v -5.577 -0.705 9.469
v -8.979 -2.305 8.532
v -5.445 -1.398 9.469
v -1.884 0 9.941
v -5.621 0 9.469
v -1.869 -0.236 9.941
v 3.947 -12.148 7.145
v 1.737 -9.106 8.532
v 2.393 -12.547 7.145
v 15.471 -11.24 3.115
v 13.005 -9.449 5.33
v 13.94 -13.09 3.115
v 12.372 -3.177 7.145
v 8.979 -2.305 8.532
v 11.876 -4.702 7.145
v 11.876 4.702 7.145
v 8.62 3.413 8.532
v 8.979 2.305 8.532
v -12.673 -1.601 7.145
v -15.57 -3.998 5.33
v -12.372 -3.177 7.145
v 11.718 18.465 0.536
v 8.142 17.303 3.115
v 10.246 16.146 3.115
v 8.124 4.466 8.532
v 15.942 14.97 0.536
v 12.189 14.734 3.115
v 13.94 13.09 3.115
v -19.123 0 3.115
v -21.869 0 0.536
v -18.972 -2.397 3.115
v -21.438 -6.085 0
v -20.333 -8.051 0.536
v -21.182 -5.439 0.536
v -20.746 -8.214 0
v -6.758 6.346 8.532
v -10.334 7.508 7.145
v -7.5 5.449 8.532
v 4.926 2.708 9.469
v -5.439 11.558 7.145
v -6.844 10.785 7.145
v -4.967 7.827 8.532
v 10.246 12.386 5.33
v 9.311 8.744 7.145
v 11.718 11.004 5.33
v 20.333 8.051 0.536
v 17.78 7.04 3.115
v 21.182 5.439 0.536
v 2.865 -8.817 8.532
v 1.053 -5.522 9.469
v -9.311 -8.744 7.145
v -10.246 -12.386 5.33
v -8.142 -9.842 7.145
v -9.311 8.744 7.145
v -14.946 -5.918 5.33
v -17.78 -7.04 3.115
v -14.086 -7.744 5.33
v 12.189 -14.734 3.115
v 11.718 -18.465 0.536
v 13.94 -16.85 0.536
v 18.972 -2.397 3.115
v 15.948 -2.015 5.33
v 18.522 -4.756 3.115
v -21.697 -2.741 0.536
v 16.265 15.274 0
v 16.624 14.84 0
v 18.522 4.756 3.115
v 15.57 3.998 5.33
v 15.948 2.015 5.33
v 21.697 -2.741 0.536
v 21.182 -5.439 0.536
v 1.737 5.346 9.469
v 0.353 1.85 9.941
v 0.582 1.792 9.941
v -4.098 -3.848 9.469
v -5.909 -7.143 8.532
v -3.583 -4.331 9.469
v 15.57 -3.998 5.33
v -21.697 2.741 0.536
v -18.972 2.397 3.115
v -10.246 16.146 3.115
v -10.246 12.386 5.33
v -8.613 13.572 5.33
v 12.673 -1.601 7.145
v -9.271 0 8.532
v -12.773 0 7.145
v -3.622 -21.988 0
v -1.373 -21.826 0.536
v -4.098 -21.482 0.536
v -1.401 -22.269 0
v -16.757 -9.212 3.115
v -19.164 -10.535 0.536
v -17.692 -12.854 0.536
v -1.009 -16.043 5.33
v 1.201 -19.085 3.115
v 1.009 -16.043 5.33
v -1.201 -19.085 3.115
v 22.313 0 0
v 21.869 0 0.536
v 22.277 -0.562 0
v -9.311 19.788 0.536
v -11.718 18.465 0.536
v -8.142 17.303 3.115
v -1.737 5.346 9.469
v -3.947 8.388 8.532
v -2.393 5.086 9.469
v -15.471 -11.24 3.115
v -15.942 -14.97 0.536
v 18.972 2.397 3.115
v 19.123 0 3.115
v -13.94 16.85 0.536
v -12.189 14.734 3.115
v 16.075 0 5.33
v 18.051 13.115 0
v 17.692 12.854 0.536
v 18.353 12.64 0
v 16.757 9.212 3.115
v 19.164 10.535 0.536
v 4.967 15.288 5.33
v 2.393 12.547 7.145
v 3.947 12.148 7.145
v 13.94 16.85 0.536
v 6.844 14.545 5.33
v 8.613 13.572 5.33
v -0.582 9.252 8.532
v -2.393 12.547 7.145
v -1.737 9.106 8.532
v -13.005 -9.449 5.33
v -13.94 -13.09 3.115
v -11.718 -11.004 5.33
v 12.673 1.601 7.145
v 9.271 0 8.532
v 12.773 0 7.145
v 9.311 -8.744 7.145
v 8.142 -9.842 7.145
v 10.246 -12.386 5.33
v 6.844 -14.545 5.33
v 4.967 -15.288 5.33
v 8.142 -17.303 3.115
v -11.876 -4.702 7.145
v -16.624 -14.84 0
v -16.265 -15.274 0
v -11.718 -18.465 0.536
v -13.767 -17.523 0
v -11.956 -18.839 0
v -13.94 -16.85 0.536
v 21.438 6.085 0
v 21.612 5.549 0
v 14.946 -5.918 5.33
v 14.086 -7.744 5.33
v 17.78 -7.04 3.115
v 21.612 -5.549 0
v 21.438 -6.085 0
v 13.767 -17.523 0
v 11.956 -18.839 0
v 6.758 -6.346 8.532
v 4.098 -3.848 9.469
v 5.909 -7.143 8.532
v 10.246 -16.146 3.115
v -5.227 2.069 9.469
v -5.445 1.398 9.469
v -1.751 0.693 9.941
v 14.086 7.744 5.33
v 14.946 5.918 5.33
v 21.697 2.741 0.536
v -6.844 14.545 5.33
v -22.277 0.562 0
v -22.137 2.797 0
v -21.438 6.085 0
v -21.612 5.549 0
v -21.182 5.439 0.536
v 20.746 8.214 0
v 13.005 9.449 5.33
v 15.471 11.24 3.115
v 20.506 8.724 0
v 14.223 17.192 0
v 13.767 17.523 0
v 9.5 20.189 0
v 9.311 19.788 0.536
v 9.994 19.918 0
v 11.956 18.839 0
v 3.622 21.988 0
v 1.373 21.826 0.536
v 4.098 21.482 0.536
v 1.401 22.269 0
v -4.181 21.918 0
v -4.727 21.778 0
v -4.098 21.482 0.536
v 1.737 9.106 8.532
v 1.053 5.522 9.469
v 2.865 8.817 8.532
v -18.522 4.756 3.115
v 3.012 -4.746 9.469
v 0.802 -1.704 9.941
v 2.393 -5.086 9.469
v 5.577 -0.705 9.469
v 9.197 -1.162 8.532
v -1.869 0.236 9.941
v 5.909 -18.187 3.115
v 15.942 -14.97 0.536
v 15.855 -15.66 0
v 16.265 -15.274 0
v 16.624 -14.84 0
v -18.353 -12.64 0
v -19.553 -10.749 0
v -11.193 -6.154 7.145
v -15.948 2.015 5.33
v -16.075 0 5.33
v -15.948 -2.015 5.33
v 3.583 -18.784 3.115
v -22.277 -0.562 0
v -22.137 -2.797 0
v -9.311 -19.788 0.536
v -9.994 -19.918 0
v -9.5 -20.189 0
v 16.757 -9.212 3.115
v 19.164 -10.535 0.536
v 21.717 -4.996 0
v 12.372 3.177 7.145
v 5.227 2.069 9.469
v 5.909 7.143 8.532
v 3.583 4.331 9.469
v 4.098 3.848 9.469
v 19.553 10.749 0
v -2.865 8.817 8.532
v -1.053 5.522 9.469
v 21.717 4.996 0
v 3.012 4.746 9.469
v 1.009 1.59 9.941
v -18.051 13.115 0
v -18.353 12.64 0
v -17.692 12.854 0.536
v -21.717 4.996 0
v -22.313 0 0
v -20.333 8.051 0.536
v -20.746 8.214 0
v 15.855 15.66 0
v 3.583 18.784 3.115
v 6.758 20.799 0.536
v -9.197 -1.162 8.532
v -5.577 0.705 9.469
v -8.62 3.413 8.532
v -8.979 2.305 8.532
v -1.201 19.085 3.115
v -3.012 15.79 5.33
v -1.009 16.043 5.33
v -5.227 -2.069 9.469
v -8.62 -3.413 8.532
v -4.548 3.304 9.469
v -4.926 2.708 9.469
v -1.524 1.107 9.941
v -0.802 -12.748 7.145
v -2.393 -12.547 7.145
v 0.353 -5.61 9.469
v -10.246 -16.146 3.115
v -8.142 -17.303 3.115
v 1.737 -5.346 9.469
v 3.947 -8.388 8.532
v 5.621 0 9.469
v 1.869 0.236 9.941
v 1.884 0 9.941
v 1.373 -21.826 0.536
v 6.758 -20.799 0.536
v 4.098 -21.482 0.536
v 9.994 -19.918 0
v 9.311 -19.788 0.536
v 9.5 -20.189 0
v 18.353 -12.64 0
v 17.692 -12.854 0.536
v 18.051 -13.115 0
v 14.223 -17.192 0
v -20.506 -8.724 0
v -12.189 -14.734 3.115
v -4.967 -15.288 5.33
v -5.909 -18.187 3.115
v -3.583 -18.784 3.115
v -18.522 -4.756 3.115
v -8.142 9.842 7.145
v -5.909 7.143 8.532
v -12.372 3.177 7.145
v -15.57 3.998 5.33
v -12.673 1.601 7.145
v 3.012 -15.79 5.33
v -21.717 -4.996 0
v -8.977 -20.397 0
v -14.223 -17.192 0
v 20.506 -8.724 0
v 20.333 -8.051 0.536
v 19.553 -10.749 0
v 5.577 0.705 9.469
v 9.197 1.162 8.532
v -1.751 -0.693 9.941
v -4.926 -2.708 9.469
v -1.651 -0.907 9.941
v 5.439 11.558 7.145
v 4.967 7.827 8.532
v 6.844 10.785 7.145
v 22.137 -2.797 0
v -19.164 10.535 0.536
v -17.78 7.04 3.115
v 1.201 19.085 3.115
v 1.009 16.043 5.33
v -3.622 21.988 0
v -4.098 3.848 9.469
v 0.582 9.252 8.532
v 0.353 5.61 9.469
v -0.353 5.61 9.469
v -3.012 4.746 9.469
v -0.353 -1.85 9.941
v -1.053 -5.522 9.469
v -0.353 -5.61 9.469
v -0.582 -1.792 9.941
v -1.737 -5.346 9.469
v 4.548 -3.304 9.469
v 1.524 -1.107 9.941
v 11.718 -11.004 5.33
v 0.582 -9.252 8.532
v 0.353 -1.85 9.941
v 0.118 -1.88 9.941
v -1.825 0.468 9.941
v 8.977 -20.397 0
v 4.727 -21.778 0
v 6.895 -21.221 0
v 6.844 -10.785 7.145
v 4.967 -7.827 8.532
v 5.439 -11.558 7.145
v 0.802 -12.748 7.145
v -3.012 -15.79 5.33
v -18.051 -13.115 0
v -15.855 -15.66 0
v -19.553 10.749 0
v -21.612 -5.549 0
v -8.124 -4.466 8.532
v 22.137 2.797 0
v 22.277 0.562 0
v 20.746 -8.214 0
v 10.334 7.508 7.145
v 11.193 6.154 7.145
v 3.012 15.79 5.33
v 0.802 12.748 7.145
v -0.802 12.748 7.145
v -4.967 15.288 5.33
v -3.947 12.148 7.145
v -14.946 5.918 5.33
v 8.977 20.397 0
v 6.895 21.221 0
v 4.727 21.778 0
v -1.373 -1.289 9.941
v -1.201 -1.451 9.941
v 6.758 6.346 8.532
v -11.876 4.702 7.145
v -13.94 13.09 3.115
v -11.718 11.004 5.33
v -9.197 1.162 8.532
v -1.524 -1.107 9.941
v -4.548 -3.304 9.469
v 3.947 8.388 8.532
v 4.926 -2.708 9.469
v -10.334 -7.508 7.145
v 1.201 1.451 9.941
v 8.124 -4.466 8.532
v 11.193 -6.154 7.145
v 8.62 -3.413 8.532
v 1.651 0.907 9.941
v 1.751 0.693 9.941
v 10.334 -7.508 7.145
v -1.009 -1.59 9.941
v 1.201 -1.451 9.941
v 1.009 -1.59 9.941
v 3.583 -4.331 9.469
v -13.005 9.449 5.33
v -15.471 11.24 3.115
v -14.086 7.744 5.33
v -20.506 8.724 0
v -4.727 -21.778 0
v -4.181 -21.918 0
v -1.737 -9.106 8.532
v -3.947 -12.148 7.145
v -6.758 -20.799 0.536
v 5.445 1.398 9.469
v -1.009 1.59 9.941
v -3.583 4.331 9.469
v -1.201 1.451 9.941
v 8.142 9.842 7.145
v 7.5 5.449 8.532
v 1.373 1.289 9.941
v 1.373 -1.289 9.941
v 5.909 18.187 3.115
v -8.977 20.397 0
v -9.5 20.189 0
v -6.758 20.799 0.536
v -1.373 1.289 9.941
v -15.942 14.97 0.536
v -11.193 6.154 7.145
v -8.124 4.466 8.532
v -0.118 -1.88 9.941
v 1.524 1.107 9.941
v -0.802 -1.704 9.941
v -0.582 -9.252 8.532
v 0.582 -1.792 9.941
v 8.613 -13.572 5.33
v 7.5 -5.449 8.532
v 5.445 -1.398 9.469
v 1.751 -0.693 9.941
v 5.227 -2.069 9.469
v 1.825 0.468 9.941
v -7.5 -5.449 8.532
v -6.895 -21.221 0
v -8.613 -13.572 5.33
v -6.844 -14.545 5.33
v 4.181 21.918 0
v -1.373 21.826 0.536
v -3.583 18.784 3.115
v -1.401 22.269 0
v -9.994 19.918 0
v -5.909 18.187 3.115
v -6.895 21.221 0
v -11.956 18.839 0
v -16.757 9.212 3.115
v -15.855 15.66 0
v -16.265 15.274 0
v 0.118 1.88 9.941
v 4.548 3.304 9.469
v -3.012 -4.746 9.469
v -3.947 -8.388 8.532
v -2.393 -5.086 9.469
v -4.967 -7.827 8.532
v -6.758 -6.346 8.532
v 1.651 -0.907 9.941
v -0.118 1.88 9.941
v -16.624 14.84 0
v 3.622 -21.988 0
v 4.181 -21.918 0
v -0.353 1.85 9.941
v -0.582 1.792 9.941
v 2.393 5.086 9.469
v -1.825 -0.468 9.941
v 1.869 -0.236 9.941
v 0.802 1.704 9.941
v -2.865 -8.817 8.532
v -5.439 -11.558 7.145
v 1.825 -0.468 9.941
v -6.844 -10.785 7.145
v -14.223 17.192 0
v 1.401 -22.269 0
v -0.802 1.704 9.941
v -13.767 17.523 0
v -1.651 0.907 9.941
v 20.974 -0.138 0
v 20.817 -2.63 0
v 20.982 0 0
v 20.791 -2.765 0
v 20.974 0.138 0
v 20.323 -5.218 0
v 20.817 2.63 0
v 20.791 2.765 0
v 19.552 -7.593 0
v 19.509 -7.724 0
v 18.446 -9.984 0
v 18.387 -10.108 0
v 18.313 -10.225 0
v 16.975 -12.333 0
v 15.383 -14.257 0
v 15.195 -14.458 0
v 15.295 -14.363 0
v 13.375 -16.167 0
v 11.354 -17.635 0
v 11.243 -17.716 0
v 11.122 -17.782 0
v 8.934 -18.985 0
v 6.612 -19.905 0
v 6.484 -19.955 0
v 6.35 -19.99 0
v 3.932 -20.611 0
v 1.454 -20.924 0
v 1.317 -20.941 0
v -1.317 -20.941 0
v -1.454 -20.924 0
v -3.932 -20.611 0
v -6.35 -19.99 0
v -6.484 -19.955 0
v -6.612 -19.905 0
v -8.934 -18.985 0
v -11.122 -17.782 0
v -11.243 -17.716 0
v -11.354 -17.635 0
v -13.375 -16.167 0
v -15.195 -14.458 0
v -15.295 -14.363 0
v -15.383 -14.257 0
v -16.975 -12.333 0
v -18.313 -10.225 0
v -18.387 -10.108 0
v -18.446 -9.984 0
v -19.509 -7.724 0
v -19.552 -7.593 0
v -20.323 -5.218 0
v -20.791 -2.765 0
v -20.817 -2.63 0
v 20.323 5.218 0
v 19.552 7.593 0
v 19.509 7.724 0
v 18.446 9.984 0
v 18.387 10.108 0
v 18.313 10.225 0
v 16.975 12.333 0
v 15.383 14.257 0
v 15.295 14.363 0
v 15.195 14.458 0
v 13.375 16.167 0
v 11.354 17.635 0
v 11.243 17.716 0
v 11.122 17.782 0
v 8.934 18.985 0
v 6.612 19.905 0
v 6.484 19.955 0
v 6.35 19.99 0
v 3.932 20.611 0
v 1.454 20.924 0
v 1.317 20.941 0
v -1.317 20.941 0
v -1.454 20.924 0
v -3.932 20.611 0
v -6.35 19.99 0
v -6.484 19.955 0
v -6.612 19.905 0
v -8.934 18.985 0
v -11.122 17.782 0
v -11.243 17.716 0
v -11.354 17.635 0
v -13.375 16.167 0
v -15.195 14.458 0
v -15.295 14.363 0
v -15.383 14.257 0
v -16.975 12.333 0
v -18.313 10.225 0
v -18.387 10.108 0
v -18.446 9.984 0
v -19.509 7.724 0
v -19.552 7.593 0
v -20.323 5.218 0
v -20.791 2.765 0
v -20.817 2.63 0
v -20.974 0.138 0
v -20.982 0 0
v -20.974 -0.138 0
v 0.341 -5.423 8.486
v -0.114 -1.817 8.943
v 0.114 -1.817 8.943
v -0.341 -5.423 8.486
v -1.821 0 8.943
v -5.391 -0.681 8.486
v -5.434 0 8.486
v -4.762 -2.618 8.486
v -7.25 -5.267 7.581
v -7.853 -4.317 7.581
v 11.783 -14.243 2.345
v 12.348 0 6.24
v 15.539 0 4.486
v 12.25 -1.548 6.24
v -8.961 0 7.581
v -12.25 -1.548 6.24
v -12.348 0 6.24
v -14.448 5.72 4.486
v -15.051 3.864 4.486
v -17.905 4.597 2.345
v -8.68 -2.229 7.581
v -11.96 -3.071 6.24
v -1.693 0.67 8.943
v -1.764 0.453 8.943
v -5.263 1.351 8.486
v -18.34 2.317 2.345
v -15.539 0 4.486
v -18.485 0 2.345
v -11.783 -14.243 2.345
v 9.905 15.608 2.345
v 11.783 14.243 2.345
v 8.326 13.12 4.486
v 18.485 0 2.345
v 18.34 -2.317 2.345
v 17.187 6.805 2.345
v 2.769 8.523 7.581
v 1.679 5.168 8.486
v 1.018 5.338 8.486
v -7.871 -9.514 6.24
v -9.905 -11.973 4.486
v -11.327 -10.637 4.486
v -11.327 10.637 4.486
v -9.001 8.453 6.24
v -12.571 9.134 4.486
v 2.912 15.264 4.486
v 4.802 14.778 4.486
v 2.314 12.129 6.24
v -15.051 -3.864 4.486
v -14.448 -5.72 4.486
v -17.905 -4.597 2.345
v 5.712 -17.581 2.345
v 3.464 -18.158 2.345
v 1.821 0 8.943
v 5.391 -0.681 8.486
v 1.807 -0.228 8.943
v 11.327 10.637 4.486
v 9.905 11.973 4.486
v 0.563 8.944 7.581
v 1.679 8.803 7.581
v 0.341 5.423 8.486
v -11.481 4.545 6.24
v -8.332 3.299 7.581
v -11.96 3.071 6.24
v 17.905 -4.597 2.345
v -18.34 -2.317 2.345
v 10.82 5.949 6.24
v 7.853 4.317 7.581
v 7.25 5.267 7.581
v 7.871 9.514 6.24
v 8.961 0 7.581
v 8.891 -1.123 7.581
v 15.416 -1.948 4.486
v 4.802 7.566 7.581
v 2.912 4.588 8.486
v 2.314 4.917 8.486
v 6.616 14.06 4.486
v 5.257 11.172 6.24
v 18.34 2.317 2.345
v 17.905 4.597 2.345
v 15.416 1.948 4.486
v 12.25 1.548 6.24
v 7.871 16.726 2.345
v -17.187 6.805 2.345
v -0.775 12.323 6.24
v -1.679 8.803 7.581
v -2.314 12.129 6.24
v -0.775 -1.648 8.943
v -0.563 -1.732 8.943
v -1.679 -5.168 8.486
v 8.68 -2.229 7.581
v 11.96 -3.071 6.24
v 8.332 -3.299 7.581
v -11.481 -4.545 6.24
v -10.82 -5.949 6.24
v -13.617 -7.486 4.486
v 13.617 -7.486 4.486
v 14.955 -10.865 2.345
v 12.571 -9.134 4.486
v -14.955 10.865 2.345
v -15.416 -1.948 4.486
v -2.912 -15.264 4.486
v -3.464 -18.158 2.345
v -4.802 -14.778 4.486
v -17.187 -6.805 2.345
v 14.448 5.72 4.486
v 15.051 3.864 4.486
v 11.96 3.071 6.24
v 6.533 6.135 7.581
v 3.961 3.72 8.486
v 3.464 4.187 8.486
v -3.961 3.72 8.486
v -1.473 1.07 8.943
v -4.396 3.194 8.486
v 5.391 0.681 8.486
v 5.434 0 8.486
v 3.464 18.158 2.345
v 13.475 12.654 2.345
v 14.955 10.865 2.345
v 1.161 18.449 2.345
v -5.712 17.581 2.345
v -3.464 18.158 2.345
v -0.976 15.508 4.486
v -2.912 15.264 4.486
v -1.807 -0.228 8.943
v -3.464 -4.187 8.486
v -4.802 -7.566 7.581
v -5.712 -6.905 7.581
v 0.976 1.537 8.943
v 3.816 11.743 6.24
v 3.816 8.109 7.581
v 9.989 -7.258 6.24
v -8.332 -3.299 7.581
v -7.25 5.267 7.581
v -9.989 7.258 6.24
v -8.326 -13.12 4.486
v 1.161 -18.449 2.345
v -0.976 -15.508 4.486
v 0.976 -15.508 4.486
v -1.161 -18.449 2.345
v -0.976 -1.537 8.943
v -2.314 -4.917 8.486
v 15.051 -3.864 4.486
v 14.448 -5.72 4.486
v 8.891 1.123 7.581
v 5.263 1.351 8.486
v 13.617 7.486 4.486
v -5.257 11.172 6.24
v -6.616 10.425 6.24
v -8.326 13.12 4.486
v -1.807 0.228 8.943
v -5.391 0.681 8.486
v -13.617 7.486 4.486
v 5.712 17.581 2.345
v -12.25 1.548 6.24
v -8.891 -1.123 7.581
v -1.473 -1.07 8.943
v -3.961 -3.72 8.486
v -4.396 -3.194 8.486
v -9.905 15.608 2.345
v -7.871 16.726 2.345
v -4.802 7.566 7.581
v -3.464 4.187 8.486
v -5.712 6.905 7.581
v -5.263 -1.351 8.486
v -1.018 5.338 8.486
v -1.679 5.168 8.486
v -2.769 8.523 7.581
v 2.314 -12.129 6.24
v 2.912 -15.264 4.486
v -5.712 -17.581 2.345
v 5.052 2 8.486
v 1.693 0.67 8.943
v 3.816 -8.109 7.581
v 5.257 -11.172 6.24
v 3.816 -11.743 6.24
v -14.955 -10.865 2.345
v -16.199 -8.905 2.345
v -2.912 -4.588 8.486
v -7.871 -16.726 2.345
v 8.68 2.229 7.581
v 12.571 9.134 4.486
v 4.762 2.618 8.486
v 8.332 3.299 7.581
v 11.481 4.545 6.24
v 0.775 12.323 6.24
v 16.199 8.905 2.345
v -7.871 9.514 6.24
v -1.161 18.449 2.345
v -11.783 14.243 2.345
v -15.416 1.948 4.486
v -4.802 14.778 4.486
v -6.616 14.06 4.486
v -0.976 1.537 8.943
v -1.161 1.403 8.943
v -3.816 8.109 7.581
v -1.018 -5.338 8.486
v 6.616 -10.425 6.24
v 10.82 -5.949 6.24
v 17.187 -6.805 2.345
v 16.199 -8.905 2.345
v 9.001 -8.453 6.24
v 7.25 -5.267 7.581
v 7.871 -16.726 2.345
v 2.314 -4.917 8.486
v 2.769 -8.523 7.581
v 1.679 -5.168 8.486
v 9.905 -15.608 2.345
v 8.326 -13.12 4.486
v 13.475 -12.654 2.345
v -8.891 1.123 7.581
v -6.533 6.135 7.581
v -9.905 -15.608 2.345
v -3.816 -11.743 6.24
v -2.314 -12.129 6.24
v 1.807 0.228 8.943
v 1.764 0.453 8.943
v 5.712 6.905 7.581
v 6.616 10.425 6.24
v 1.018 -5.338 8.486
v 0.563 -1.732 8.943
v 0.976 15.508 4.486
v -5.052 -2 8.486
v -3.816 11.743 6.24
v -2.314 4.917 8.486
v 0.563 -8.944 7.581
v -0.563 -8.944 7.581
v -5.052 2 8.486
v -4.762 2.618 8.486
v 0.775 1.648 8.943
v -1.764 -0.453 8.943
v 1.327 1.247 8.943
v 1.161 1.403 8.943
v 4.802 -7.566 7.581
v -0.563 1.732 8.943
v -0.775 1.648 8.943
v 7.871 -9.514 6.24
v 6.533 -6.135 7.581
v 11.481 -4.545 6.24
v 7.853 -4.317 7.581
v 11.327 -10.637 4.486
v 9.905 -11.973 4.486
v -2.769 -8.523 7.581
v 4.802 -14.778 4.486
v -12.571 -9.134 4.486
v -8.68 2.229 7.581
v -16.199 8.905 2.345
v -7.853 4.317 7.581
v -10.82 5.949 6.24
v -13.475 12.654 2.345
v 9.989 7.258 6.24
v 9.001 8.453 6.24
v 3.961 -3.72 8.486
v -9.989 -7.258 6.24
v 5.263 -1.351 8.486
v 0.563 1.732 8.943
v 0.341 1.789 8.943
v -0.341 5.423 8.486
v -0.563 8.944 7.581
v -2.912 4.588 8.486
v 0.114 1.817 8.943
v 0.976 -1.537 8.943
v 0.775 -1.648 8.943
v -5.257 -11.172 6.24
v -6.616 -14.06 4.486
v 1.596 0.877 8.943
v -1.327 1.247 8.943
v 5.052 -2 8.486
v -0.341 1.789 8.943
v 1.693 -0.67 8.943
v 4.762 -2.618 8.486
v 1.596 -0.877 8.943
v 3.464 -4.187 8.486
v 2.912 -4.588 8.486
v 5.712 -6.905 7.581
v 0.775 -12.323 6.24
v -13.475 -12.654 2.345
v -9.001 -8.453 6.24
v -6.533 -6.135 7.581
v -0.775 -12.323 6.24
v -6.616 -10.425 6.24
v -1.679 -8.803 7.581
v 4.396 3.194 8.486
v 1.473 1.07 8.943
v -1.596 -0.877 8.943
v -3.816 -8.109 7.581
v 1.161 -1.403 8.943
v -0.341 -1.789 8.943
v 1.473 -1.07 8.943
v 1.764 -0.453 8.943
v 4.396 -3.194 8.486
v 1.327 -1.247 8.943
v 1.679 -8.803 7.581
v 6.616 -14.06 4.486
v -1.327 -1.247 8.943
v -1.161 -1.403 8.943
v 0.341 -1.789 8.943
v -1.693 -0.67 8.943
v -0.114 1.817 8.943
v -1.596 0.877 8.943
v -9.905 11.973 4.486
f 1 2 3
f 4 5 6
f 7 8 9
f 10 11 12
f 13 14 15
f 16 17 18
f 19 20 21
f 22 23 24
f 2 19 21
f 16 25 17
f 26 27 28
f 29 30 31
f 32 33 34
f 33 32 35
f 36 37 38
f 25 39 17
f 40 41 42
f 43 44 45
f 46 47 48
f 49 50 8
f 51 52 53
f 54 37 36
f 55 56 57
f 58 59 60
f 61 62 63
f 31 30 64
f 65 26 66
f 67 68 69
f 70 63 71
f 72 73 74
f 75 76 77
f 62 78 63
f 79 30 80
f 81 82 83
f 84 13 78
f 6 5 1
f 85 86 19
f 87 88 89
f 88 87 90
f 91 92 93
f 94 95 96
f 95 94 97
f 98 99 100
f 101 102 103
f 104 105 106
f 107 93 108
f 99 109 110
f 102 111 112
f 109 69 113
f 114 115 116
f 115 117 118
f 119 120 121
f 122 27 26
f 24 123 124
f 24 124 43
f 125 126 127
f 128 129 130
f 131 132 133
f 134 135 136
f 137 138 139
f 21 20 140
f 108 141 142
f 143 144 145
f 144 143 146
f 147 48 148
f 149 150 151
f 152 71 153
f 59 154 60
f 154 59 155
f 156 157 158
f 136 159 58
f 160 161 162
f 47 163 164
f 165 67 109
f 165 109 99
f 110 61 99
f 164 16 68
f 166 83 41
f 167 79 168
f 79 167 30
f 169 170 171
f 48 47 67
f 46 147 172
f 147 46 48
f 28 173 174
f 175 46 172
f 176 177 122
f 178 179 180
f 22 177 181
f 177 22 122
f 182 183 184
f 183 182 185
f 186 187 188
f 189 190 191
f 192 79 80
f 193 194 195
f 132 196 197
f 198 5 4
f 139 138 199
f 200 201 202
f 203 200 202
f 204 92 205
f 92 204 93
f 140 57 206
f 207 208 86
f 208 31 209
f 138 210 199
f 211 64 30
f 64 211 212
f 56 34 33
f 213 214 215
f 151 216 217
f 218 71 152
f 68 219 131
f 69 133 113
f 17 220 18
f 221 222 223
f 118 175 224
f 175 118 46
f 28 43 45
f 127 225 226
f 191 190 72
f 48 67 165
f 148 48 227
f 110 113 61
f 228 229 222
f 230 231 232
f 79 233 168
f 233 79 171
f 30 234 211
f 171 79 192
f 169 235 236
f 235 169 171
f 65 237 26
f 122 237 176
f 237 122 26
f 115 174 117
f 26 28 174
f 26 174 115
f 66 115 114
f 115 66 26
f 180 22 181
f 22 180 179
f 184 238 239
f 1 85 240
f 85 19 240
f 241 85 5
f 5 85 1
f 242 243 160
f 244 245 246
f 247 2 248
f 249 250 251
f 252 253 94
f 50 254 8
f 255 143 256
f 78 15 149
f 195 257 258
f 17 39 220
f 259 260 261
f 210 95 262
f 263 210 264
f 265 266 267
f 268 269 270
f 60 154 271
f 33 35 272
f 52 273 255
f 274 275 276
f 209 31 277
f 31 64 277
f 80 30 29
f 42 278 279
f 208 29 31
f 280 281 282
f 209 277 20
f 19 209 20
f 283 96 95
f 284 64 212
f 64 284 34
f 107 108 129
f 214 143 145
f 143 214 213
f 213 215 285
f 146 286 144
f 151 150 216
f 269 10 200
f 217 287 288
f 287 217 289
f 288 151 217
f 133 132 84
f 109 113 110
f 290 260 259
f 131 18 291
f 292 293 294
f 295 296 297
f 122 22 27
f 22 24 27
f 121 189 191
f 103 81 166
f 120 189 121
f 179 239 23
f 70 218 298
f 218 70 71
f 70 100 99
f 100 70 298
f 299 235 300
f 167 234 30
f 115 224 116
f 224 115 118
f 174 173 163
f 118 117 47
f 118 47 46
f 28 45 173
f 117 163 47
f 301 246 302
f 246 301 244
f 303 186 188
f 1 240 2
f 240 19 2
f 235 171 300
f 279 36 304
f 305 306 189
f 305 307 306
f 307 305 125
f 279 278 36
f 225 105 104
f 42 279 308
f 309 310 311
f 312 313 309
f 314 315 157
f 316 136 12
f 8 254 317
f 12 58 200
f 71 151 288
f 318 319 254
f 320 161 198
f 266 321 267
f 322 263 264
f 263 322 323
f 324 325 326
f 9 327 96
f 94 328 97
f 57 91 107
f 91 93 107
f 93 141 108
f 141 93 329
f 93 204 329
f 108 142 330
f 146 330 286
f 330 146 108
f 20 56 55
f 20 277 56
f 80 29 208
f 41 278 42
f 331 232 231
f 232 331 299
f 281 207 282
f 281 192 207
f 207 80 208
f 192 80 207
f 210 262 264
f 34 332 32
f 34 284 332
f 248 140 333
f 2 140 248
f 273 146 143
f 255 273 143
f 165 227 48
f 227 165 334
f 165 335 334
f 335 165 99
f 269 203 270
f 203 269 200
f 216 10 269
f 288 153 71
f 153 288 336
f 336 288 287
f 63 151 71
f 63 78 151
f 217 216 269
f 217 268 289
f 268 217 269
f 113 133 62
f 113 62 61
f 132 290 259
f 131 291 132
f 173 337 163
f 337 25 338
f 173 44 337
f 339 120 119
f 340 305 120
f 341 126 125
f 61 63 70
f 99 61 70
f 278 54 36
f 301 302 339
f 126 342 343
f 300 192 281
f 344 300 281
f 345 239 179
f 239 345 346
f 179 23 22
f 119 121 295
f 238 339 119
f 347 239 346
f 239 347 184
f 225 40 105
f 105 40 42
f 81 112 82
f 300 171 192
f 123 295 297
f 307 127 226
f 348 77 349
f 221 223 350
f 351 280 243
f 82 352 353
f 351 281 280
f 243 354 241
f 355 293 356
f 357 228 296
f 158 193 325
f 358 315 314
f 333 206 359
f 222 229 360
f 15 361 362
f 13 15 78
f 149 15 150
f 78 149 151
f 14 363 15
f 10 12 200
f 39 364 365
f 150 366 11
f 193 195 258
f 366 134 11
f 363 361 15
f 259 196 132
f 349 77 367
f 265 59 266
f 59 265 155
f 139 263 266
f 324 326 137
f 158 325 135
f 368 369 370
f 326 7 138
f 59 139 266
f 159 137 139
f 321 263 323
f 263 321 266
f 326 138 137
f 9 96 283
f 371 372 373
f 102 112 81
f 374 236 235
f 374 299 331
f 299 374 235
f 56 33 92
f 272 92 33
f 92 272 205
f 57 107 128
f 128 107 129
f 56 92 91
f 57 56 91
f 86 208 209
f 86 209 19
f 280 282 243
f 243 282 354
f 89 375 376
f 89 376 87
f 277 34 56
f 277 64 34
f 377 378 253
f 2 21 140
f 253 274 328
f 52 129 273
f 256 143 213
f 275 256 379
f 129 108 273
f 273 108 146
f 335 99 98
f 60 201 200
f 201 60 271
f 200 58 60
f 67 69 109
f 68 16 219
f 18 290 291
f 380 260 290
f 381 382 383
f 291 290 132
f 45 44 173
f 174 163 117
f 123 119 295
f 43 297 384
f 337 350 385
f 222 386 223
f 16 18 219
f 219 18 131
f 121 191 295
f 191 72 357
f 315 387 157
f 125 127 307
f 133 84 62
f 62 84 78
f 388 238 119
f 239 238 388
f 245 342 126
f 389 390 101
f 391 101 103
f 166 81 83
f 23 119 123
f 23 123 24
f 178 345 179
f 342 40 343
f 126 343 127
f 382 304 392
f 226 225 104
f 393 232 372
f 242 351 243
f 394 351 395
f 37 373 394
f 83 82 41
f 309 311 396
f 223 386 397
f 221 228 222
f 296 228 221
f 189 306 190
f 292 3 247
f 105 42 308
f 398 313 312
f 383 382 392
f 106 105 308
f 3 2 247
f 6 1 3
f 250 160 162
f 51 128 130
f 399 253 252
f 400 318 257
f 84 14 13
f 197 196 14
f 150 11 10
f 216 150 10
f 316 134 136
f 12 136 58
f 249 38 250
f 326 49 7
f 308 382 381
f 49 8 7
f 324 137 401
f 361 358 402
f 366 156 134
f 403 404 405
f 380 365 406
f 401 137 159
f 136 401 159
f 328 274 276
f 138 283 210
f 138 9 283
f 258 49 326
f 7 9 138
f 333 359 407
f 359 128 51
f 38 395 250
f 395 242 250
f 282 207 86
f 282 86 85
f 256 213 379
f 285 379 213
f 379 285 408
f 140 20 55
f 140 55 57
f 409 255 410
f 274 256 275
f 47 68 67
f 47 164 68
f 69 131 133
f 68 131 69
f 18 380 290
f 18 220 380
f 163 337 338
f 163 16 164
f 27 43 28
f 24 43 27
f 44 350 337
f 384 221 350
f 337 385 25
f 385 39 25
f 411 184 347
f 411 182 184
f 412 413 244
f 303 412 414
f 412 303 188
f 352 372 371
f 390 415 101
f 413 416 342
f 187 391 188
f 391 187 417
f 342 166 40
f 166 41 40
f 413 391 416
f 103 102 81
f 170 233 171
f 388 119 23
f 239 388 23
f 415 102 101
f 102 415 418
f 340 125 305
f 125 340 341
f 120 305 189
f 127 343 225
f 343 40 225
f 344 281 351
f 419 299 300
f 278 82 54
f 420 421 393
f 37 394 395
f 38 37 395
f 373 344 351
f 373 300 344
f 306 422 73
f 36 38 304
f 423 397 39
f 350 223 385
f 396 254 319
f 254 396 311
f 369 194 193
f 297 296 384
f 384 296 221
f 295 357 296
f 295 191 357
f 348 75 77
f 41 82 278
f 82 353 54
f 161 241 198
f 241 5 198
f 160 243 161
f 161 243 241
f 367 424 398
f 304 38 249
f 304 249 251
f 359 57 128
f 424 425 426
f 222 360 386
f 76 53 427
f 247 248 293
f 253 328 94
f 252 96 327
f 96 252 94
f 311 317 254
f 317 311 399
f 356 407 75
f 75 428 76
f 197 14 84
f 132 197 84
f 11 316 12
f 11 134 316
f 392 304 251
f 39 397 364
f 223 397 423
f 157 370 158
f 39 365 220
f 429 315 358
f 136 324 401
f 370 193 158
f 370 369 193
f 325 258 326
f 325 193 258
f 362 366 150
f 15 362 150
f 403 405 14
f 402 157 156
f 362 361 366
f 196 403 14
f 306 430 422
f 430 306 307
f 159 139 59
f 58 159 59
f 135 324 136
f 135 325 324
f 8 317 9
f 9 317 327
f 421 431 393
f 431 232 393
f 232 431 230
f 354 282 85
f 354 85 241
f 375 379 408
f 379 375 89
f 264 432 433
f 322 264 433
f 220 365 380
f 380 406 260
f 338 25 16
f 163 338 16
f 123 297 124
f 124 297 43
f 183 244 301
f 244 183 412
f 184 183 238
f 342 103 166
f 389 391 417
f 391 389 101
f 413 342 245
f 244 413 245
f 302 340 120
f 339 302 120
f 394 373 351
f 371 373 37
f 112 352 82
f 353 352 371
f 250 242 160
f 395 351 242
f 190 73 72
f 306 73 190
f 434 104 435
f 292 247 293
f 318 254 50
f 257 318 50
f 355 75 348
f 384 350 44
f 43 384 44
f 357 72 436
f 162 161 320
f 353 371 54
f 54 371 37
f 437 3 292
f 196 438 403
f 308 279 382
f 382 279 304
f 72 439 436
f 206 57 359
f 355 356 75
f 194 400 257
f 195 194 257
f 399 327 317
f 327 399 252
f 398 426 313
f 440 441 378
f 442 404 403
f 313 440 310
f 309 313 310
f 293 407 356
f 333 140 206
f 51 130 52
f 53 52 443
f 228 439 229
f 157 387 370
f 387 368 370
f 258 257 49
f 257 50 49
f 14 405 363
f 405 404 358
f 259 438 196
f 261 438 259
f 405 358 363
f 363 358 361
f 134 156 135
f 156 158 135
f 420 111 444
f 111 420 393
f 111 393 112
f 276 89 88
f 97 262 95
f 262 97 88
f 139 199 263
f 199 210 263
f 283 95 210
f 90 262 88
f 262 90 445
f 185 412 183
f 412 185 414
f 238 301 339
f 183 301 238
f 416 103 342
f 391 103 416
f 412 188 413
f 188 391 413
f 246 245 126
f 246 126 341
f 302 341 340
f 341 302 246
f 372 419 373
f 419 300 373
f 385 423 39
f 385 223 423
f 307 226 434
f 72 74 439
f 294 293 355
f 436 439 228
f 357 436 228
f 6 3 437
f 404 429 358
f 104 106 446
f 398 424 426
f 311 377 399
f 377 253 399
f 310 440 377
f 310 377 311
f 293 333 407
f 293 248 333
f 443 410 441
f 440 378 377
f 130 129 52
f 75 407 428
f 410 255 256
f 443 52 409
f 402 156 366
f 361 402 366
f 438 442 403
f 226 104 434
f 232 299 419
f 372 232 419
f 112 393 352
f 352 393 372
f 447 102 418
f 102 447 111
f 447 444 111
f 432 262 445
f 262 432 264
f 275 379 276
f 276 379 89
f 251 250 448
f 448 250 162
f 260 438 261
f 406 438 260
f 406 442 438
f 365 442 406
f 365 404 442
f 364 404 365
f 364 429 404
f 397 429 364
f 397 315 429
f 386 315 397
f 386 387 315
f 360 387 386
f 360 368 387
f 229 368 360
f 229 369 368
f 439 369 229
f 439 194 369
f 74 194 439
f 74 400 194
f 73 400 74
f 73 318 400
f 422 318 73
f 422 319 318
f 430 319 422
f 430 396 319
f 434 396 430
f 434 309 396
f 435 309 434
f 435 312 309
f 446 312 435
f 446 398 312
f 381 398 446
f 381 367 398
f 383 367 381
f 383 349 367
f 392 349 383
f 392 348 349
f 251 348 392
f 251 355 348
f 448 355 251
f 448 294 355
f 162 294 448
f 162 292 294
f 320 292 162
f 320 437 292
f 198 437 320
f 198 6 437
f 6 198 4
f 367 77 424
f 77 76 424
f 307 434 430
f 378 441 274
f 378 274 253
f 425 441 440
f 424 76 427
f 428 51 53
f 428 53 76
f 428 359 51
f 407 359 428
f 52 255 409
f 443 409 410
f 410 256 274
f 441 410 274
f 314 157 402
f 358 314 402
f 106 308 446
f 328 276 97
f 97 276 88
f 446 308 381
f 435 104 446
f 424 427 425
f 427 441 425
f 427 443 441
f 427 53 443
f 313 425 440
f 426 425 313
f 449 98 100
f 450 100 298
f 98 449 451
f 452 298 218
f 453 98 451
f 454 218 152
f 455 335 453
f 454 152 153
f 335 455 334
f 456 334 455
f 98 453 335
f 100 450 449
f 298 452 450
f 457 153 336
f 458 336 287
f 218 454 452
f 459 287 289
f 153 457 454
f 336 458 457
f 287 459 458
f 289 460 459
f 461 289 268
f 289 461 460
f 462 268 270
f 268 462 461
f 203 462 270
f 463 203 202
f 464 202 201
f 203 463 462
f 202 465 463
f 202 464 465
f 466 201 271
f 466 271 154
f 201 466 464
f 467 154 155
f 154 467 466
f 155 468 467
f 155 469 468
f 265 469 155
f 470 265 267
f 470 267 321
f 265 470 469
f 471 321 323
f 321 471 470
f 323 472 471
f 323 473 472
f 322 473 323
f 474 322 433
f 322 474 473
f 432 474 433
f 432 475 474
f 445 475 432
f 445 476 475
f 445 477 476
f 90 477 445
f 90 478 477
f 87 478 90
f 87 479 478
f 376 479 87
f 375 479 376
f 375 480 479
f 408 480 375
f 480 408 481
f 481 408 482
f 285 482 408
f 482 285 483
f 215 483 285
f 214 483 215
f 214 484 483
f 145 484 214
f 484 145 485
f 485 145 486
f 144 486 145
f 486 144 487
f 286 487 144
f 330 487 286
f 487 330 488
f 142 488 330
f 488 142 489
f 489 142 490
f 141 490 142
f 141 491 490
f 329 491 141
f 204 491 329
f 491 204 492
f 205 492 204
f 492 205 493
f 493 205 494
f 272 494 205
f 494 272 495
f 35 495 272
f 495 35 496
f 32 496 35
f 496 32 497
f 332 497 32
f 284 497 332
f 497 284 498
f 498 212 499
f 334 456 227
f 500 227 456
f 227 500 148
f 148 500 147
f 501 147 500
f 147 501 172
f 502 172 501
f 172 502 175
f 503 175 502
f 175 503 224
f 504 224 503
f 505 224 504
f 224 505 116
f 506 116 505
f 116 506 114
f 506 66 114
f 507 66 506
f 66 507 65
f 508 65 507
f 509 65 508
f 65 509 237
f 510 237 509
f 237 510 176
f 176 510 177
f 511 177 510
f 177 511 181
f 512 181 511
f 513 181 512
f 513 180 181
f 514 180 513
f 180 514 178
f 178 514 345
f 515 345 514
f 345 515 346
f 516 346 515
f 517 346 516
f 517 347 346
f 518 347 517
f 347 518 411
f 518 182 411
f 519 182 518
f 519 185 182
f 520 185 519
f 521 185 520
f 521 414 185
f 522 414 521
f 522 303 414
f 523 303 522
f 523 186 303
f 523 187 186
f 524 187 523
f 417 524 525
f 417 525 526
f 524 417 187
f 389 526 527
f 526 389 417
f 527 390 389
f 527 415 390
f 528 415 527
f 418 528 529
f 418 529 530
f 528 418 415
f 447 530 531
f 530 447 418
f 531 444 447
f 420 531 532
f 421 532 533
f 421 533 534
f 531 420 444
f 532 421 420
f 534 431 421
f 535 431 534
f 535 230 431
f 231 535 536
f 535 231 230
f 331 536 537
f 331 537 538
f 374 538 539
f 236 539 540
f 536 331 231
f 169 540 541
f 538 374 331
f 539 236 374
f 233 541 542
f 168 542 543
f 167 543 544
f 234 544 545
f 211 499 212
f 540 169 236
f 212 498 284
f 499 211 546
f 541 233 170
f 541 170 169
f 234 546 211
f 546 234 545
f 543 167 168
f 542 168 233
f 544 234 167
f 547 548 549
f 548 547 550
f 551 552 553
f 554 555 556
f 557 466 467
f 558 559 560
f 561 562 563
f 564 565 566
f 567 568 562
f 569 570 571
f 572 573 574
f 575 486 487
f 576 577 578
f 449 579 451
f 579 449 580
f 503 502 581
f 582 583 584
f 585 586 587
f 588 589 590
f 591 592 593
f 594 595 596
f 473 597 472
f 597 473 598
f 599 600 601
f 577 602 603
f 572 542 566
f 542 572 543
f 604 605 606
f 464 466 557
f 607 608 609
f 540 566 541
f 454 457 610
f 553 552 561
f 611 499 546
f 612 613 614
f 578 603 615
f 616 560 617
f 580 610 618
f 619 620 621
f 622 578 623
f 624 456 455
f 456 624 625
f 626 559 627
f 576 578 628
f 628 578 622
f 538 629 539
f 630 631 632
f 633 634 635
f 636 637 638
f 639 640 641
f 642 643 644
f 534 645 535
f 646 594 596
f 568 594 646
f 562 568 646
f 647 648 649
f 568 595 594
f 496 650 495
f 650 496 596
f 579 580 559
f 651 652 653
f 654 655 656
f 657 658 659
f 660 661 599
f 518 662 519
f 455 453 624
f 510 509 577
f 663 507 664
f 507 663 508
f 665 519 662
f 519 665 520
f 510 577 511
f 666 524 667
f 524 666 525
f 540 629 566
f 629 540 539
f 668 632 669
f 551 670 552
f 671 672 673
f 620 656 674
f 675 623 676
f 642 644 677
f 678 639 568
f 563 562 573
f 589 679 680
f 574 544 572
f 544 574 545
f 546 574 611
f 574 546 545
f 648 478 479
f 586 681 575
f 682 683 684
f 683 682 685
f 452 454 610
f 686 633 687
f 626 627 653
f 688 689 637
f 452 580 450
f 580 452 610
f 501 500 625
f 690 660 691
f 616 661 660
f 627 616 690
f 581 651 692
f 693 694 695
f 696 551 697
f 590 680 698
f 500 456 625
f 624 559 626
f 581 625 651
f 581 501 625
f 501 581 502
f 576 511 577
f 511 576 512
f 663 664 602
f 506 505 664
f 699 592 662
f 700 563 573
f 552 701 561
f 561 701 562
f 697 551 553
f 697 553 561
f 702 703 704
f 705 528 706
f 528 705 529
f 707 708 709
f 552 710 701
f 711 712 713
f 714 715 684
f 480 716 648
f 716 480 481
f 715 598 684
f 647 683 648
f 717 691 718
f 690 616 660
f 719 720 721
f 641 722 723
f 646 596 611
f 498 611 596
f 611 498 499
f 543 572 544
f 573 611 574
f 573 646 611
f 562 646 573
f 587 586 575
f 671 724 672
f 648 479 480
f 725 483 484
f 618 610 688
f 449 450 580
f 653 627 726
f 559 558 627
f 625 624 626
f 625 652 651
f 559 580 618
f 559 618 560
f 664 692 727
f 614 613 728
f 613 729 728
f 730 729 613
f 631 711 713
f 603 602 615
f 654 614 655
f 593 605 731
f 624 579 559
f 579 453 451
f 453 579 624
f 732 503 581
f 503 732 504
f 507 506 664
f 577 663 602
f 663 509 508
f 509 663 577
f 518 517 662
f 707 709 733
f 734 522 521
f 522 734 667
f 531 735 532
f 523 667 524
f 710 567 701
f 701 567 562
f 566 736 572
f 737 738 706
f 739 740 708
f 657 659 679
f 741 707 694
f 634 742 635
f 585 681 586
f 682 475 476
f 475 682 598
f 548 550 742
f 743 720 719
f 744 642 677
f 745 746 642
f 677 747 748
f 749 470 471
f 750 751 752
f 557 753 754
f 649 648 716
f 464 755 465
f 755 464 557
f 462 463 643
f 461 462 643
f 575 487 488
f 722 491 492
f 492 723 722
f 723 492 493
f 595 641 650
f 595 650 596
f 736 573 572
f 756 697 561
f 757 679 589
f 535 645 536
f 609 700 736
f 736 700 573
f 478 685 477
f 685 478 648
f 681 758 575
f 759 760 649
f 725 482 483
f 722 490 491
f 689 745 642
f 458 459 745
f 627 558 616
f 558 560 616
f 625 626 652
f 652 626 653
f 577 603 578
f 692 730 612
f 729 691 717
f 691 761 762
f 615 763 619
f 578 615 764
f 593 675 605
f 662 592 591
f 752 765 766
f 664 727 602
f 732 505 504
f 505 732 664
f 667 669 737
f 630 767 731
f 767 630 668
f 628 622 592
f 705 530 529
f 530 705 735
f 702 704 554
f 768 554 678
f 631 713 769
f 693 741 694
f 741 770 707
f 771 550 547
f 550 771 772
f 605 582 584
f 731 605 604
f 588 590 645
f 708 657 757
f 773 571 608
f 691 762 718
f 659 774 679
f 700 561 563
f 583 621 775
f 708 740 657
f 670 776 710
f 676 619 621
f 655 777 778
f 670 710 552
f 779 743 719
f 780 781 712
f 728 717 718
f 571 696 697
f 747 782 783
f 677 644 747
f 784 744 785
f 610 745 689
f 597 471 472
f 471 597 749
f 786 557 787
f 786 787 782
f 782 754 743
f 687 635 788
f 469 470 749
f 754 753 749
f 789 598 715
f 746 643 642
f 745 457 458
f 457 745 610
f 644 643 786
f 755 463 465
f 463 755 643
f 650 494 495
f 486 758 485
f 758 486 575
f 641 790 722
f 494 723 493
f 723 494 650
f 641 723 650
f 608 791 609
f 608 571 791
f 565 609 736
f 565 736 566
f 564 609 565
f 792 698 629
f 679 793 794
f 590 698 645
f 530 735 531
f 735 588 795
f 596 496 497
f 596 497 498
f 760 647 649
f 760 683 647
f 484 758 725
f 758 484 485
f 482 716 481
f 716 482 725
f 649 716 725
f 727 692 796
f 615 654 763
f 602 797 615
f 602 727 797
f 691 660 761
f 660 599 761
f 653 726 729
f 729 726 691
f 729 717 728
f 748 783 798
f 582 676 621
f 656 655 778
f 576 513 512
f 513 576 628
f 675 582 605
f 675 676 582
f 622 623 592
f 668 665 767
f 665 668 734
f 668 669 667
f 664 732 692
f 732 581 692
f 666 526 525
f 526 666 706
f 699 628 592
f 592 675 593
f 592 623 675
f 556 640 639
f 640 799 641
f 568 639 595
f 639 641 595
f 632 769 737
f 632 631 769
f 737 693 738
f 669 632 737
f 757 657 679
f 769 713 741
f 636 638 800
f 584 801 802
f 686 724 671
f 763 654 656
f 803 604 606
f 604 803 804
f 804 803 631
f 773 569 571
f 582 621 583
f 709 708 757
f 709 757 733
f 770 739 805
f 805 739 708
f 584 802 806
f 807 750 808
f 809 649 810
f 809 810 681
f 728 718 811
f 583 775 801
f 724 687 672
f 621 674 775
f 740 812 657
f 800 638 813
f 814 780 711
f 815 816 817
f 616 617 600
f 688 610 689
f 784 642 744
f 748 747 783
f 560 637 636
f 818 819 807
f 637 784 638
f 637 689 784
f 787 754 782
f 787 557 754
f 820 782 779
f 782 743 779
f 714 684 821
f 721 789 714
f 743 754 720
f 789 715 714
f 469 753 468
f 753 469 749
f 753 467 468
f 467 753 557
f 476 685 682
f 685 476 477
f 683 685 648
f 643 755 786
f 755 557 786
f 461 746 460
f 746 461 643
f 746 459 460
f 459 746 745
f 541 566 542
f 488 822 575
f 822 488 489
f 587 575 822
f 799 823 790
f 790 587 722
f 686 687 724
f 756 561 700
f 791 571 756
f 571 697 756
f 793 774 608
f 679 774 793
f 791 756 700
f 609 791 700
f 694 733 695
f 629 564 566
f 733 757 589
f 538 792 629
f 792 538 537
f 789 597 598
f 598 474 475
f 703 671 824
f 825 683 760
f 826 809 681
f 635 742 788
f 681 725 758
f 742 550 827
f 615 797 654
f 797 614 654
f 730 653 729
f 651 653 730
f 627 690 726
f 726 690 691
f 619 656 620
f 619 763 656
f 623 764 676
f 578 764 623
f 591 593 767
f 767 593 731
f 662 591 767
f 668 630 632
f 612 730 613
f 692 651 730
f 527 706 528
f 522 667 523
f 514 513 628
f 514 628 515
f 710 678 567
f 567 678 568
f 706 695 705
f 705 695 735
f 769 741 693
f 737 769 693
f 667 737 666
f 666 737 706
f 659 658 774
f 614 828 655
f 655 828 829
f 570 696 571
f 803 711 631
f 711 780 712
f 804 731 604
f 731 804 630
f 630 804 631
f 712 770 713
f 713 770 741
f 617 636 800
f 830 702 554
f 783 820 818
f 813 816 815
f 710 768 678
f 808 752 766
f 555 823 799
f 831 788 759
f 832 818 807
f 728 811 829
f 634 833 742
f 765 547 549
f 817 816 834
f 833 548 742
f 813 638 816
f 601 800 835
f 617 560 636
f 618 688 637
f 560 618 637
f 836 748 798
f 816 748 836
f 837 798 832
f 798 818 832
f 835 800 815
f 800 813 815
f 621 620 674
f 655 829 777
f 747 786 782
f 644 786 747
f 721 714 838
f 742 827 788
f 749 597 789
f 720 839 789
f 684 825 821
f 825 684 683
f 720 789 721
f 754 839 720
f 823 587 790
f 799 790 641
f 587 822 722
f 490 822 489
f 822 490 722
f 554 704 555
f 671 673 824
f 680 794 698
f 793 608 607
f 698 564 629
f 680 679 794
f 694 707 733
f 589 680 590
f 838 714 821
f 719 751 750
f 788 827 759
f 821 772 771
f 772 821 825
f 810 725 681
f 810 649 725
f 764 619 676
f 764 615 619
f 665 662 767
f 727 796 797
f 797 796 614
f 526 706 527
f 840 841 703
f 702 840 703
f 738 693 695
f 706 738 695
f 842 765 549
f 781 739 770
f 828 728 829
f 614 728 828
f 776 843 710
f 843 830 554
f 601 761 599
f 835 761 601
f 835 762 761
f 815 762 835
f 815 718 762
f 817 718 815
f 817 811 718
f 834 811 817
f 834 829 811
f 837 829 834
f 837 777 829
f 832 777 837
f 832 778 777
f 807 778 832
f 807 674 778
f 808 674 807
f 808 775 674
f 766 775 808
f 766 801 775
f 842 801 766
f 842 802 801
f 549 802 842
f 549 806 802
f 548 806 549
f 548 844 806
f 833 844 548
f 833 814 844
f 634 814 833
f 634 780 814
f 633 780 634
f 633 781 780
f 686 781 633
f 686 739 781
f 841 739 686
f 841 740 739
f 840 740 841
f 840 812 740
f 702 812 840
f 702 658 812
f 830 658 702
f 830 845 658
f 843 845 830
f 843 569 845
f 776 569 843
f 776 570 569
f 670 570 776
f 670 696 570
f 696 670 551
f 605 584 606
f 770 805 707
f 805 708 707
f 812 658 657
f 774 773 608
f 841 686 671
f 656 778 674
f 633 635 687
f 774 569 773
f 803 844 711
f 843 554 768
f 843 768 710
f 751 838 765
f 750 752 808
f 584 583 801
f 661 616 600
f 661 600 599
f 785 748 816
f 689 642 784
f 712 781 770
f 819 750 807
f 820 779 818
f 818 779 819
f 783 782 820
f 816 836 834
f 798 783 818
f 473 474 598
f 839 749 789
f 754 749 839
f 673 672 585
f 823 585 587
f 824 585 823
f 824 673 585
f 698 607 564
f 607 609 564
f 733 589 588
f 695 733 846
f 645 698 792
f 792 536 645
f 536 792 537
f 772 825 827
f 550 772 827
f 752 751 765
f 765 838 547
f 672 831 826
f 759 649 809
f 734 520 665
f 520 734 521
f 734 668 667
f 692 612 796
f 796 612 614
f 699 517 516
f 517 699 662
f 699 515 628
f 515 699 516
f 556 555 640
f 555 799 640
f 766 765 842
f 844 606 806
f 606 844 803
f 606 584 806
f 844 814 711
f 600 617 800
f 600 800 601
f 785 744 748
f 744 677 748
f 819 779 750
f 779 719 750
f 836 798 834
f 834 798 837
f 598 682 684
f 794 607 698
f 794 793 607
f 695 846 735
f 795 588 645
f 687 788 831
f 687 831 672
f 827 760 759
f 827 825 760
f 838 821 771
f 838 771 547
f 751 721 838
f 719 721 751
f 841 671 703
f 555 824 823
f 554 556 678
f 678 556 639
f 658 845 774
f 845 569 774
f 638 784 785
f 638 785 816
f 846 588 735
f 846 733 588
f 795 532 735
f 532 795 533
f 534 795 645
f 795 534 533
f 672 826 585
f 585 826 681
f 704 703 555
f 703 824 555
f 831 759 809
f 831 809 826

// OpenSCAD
// Not an actual lens, useful as frosted cover for a light.
// Hari Wiguna, 2015

// Outer radius of the base of the lens
r = 30;

// Height of the lens (from base to center top of lens)
h = 10;

// How thick is the lens itself
thickness = 1;

// Resolution
res = 50;

$fn = res;
rs = r - thickness;

translate([0,0,-(r-h)])
    lens();

module lens()
{
    difference()
    {
        intersection()
        {
            sphere(r);        

            translate([-r,-r,r-h])
                cube([2*r,2*r,h]);    
        }

        sphere(rs);        
    }
}
